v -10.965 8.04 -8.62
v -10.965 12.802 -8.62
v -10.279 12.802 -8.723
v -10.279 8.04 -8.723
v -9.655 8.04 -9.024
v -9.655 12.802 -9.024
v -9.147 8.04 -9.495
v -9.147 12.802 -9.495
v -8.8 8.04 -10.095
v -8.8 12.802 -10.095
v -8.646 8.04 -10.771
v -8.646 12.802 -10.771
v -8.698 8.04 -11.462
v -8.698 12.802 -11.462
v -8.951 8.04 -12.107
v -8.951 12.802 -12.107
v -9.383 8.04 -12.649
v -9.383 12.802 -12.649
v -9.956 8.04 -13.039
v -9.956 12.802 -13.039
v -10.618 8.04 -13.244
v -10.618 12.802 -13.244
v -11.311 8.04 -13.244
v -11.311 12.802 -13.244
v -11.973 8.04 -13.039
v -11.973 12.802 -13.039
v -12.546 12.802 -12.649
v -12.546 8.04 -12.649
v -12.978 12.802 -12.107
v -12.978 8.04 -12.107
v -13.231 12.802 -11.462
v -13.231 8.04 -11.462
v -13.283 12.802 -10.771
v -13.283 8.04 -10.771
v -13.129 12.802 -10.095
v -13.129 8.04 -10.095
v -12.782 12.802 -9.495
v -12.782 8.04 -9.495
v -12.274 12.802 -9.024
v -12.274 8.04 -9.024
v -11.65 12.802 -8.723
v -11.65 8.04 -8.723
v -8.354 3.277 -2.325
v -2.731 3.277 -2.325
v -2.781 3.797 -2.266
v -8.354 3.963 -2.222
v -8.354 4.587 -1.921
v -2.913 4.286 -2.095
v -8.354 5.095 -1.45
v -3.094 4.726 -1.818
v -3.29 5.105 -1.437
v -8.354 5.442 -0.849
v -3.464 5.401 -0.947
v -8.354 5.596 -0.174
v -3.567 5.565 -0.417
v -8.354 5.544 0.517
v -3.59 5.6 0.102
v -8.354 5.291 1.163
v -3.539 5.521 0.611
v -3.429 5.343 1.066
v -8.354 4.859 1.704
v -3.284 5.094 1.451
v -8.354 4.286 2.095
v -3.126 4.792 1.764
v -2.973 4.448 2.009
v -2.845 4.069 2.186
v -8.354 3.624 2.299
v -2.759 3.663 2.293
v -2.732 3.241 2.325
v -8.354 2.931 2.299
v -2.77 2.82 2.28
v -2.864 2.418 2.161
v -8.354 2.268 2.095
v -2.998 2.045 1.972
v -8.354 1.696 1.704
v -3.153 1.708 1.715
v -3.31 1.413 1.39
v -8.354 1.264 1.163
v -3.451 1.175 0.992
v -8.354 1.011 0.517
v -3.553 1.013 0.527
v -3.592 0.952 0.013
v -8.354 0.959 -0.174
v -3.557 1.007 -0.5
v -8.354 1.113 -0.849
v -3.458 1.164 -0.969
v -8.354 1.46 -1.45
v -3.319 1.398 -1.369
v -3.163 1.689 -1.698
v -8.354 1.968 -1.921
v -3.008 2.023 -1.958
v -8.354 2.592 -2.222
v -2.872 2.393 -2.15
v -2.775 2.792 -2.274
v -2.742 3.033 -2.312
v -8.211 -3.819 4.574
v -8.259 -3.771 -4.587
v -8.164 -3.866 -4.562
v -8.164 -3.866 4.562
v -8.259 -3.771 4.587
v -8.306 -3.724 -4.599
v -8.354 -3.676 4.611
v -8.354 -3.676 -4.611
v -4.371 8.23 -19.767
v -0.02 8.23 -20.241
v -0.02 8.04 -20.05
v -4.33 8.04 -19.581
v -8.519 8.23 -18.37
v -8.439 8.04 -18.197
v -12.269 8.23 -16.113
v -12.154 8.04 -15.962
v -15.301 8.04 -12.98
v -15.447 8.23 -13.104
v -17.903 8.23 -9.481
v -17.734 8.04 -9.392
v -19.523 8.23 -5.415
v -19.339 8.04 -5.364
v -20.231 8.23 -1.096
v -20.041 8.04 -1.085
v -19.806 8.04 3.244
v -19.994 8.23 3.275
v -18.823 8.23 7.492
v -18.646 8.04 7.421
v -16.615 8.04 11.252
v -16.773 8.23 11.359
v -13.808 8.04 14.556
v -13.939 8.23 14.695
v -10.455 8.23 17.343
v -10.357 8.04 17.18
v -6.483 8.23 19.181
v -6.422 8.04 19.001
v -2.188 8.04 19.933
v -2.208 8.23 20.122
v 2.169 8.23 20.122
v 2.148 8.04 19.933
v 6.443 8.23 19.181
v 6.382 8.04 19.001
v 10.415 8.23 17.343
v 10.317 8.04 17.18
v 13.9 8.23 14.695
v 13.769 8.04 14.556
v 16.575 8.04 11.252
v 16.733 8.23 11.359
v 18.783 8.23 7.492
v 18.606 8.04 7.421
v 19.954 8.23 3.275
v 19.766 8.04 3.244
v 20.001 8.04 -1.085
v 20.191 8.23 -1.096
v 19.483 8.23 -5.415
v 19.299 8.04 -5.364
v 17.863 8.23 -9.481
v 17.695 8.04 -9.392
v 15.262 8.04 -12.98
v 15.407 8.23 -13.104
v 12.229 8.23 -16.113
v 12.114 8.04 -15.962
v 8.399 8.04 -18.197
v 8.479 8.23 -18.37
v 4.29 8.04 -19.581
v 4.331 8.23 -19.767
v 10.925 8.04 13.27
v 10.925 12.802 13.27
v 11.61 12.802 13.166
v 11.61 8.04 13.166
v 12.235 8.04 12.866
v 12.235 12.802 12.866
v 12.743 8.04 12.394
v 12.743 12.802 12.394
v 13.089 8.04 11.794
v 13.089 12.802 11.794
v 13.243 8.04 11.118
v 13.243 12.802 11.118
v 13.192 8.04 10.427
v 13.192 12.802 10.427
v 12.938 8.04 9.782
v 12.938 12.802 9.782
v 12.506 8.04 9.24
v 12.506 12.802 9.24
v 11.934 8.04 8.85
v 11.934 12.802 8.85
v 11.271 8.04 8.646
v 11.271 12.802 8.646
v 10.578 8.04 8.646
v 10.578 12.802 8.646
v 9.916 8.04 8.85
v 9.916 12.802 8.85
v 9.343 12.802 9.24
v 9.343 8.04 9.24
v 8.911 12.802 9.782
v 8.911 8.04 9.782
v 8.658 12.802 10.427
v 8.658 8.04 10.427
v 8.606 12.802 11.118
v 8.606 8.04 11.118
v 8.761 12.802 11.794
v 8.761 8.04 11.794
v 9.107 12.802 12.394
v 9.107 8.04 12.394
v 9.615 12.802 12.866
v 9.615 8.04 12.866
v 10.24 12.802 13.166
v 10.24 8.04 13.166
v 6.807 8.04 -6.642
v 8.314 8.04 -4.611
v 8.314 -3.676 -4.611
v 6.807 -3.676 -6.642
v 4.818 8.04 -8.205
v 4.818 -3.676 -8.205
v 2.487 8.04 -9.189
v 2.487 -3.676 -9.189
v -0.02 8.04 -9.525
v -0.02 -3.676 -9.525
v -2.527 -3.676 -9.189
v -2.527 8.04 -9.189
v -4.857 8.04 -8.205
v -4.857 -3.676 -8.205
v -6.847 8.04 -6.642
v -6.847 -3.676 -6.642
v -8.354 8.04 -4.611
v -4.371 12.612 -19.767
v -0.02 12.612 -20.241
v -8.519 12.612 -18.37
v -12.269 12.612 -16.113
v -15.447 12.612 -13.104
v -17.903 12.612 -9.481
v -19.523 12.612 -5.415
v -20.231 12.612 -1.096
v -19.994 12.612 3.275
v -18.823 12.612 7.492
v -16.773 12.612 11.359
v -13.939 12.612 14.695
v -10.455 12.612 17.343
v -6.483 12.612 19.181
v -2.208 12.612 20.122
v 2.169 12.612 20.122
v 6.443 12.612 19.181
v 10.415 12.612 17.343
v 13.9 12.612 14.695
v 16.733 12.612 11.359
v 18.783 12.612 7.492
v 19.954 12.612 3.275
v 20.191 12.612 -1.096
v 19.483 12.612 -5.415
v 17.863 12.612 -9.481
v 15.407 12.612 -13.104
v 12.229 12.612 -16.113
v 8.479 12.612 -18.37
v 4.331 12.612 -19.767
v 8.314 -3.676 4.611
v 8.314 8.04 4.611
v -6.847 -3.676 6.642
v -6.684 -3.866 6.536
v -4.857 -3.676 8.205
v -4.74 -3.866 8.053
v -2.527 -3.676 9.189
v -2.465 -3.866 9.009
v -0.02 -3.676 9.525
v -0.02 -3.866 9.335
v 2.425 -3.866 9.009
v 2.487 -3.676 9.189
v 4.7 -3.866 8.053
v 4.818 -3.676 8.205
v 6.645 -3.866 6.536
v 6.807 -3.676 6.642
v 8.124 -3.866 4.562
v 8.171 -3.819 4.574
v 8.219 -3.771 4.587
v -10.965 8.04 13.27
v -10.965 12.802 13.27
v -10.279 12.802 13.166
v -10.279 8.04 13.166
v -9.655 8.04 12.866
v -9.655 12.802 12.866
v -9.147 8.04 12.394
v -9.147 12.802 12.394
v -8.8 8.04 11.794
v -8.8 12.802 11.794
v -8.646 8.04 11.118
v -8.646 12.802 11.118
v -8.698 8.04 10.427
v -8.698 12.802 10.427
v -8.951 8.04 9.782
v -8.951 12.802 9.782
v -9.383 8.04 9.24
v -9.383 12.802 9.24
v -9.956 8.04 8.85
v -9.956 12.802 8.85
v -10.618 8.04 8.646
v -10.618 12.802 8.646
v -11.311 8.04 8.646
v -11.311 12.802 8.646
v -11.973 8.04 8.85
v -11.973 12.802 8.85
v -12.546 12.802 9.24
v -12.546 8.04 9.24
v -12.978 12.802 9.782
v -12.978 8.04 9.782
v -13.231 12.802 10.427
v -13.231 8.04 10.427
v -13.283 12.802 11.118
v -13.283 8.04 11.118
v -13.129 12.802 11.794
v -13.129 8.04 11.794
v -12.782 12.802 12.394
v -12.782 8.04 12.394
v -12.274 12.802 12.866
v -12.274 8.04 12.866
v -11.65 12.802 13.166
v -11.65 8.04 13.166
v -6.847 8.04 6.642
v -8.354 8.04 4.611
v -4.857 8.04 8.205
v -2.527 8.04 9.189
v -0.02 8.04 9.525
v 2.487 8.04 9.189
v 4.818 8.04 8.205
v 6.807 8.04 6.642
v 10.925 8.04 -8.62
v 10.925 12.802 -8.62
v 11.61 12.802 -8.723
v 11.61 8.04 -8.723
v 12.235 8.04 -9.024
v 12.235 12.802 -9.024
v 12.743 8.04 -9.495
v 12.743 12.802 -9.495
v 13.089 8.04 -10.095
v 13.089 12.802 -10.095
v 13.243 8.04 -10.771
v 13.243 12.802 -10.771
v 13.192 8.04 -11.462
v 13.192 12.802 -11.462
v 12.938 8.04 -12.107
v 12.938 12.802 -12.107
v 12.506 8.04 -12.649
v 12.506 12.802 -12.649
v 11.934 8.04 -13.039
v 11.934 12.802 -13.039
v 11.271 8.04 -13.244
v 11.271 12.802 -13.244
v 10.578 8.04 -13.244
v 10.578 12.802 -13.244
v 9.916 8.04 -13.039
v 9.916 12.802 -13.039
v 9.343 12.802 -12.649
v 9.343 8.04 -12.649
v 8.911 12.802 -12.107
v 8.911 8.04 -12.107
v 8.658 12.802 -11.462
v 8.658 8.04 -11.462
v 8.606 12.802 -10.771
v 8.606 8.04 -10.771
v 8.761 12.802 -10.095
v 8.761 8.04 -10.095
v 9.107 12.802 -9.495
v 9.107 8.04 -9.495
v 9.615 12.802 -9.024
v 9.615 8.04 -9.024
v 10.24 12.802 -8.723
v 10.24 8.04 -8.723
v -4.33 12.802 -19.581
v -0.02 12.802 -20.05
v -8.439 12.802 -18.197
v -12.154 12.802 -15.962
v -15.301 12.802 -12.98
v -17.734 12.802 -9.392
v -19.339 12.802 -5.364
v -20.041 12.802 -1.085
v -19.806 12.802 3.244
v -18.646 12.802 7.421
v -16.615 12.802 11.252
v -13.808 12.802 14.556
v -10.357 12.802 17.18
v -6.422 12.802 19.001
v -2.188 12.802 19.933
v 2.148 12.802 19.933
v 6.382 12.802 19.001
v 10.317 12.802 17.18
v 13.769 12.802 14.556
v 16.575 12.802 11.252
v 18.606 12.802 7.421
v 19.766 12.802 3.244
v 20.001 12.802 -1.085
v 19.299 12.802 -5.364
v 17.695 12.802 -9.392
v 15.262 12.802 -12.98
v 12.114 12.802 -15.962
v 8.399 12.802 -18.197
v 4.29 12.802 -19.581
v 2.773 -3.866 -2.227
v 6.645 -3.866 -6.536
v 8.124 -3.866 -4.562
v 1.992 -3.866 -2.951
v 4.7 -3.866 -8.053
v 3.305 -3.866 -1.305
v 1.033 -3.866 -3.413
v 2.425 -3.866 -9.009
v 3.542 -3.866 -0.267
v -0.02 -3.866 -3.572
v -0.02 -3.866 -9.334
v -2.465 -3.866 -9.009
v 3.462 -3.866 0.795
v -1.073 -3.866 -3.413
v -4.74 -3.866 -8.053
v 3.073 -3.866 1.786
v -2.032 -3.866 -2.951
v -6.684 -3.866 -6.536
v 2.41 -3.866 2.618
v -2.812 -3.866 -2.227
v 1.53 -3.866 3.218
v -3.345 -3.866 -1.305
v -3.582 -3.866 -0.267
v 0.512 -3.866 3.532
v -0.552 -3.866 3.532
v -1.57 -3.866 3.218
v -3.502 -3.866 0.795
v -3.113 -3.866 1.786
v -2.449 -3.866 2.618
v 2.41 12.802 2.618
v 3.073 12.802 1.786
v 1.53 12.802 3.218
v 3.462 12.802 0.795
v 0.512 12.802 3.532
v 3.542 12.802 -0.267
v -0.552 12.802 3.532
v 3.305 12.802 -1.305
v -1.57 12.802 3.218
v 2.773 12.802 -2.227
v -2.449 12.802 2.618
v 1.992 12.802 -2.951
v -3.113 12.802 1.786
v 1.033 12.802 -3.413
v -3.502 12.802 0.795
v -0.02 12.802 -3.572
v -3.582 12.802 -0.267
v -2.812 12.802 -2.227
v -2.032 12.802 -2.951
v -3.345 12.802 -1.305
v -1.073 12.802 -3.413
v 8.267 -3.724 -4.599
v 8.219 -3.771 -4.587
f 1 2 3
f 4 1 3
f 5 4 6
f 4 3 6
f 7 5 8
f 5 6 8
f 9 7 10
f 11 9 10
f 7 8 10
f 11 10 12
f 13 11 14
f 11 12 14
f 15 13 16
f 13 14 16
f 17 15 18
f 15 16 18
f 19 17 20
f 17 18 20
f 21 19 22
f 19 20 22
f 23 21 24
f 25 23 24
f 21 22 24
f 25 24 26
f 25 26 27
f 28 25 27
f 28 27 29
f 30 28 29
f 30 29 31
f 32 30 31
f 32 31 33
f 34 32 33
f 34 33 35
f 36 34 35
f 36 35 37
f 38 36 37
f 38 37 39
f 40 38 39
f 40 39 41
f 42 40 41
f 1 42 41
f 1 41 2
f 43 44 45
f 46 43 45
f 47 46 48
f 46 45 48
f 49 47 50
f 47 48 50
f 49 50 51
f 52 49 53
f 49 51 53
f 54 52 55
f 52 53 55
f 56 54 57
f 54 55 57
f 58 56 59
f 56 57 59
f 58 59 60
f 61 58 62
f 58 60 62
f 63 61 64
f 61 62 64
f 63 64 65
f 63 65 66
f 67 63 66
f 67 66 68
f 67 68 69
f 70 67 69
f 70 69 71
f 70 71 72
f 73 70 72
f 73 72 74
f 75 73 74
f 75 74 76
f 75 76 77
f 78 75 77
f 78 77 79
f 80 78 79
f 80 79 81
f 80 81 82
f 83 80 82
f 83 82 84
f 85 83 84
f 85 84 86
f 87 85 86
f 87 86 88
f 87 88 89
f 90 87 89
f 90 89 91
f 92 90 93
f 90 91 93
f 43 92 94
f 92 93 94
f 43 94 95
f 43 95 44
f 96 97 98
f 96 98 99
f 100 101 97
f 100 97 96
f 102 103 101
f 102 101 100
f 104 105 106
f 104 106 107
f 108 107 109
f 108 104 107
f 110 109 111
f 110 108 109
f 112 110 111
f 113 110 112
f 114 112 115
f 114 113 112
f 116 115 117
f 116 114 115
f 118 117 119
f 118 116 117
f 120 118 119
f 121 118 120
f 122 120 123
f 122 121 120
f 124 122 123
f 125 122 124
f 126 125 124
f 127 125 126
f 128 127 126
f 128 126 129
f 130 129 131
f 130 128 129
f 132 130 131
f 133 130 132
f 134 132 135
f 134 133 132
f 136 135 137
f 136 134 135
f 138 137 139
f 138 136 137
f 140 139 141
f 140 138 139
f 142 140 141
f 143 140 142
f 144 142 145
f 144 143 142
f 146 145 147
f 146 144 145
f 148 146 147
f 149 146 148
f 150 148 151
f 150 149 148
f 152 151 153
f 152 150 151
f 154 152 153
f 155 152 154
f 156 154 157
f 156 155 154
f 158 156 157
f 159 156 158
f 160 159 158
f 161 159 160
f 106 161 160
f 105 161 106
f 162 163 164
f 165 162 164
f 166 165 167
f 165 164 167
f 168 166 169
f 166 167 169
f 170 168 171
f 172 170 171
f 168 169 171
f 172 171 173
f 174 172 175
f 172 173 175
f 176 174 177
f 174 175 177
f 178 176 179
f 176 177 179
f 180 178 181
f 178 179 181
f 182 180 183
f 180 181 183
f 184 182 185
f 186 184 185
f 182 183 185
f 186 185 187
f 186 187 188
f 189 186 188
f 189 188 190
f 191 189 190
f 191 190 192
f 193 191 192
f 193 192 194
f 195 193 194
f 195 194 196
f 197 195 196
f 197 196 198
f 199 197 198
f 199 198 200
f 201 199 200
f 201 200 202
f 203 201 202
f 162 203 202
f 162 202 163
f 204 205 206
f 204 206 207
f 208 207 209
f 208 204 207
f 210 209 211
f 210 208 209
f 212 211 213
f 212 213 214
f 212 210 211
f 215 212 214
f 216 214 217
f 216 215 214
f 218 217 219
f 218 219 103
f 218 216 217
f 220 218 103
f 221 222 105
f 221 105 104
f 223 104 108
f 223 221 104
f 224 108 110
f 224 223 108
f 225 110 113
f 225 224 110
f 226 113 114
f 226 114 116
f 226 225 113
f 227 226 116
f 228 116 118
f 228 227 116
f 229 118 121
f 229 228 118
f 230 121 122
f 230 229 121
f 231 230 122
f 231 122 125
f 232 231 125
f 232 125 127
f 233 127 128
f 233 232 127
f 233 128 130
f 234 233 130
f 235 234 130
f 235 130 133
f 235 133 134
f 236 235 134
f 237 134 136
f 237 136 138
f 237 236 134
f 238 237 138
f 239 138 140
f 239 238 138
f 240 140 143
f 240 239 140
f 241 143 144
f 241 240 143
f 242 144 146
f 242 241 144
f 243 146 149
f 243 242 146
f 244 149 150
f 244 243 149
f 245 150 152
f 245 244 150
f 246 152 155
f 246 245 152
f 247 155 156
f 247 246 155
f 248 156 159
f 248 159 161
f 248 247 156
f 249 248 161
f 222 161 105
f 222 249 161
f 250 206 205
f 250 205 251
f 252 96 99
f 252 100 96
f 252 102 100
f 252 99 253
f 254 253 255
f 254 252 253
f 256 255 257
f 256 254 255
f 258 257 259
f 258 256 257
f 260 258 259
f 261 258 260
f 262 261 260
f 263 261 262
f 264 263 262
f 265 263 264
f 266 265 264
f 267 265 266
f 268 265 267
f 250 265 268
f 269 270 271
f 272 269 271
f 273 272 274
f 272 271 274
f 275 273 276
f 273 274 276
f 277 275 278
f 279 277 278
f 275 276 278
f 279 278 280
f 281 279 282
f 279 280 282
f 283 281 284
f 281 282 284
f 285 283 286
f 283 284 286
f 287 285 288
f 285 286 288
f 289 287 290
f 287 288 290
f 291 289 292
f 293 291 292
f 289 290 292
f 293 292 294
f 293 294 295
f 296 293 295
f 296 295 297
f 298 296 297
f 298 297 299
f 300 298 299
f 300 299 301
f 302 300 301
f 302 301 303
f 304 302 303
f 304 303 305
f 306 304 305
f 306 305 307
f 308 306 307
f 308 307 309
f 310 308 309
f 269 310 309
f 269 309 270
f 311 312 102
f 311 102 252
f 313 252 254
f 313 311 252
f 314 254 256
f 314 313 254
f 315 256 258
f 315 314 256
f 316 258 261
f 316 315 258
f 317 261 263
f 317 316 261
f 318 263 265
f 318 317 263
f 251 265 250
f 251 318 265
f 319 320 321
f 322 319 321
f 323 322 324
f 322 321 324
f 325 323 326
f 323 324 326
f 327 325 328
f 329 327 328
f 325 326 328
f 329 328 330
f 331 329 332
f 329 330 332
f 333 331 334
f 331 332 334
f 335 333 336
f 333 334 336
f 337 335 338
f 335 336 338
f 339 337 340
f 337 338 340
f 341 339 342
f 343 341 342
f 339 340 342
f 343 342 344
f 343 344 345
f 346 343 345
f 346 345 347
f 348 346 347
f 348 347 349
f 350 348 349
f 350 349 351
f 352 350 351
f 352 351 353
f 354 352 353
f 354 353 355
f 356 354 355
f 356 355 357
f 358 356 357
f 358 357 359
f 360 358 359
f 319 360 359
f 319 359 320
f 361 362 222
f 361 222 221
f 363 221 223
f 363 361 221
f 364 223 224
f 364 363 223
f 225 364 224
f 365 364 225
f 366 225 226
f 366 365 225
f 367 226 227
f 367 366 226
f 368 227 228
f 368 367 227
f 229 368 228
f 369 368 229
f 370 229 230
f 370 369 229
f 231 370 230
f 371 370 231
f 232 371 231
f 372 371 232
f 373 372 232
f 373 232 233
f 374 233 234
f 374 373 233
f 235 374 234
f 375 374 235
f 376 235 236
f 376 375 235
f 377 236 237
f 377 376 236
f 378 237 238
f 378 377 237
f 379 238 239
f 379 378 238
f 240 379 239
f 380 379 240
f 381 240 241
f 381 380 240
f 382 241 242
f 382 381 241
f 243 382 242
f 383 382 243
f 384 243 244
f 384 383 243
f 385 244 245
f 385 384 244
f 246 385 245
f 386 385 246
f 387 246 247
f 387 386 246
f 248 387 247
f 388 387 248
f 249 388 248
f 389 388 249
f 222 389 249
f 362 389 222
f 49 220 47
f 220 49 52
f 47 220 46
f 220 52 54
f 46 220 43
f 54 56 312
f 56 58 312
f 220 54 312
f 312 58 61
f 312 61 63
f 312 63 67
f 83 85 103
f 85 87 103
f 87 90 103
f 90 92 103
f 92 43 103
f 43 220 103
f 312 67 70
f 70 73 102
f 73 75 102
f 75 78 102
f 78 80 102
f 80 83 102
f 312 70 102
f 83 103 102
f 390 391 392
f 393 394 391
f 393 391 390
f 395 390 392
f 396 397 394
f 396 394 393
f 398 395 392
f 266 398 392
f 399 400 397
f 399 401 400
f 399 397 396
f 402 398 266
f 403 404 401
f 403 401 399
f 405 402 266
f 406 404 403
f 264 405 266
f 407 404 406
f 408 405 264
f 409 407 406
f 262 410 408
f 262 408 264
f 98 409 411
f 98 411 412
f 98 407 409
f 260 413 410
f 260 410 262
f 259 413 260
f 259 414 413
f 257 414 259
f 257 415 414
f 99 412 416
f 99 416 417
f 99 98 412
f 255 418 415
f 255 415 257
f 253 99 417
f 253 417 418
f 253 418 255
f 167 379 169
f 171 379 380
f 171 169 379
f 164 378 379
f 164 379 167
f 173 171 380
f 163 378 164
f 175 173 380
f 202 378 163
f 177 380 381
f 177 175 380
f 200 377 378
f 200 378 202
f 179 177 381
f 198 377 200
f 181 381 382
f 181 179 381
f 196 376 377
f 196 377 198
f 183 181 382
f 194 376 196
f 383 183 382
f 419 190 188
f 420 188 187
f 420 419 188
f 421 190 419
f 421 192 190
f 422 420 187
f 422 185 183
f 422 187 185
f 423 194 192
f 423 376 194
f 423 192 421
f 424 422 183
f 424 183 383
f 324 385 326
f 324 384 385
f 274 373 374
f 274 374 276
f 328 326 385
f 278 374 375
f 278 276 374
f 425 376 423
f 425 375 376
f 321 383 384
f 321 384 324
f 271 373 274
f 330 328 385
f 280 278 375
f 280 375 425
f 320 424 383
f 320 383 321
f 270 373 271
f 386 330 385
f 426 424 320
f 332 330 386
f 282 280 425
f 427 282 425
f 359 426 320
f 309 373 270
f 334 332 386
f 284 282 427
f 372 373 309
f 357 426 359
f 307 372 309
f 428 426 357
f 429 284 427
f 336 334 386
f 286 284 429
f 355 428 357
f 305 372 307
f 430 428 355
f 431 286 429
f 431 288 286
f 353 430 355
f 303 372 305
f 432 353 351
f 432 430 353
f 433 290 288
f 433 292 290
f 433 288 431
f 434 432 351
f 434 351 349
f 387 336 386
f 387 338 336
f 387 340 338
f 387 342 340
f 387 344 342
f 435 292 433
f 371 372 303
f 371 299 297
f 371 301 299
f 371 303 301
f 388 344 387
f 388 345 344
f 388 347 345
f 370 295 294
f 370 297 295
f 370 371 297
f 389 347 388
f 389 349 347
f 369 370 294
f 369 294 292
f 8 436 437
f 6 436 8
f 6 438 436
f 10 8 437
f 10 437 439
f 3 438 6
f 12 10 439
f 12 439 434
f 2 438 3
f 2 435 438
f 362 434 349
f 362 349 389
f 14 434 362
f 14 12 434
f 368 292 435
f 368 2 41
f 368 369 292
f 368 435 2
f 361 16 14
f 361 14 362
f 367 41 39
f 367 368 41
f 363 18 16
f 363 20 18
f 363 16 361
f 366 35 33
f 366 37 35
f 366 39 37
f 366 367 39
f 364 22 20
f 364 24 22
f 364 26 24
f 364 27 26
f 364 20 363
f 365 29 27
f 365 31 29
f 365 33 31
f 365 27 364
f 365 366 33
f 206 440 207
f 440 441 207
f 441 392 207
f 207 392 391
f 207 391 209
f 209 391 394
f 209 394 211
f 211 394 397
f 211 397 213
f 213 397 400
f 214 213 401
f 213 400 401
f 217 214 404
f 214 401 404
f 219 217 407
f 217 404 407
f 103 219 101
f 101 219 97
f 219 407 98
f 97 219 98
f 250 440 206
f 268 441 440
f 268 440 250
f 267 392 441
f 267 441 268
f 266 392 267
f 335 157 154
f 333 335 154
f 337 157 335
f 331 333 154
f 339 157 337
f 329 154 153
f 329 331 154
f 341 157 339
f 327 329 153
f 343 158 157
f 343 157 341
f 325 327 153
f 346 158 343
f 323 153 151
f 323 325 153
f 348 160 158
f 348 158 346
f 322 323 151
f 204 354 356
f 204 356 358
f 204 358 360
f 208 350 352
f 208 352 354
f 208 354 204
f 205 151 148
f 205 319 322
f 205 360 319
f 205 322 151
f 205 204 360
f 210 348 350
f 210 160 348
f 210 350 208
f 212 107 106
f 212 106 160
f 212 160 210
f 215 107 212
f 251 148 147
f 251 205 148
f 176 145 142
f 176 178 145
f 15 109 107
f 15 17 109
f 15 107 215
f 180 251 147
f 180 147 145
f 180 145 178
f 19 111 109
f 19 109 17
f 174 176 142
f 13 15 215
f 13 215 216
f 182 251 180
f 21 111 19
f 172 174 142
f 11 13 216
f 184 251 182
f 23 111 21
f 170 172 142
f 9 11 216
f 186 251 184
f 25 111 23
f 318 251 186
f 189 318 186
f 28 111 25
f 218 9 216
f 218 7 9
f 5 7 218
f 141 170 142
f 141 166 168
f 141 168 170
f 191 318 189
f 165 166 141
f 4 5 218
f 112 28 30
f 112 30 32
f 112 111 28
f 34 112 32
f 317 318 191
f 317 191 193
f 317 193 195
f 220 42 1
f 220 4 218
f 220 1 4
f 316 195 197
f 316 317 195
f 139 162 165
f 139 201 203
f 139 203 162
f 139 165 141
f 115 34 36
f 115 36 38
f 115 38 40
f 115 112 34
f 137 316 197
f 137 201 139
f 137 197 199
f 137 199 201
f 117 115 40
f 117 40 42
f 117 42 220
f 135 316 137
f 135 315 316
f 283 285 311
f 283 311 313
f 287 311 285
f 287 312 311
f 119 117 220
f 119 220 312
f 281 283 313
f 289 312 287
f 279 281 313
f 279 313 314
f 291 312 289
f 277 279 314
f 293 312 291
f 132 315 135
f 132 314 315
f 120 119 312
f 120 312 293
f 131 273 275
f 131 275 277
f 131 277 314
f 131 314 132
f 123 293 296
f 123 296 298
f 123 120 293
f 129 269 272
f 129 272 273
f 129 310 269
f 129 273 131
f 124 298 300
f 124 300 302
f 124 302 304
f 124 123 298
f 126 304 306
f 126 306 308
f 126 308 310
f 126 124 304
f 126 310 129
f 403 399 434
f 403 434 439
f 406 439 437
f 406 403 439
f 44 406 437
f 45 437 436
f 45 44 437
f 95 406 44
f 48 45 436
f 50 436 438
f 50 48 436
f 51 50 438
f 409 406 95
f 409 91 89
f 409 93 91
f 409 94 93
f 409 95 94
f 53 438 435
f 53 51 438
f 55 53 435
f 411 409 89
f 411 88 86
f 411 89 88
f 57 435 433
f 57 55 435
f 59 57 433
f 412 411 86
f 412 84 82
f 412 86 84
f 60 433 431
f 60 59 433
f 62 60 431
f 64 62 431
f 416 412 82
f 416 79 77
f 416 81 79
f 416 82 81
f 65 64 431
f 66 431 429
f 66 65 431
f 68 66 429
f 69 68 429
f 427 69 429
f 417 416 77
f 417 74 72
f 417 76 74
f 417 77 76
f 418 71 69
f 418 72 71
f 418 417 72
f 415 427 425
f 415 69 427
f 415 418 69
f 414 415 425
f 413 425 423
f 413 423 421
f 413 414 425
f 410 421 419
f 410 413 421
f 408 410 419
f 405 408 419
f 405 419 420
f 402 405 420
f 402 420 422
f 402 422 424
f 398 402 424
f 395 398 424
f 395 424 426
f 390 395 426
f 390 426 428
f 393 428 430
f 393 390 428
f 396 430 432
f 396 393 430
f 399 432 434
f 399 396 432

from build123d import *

# Parameters (mm, degrees)
SKETCH2_W          = 1.5875
SKETCH2_H          = 6.148361062
CUT_EXTRUDE1_DEPTH = 7.9375
SKETCH3_R          = 1.55
CUT_EXTRUDE2_DEPTH = 23.082804042
SKETCH4_R          = 1.55
CUT_EXTRUDE3_DEPTH = 23.082804093
CHAMFER1_SIZE      = 0.127
SCALE1_SCALE       = 1.5


with BuildPart() as part:
    # Sketch1 → Revolve1 (revolve)
    with BuildSketch(Plane.XY, mode=Mode.PRIVATE) as revolve1_sk:
        Polygon((6.35, 0), (6.35, 7.9375), (13.49375, 7.9375), (13.49375, 11.1125), (2.38125, 11.1125), (2.38125, 0), align=None)
    revolve(revolve1_sk.sketch.rotate(Axis((0, 0, 0), (0, 1, 0)), 90), axis=Axis((0, 0, 0), (0, 1, 0)))

    # Sketch2 → Cut-Extrude1 (cut)
    with BuildSketch(Plane.XZ):
        with Locations((-6.35, 0)):
            Rectangle(SKETCH2_W, SKETCH2_H)
        with Locations((6.35, 0)):
            Rectangle(SKETCH2_W, SKETCH2_H)
    extrude(amount=-CUT_EXTRUDE1_DEPTH, mode=Mode.SUBTRACT)

    # Sketch3 → Cut-Extrude2 (cut, through all)
    with BuildSketch(Plane(origin=(0, 0, 0), x_dir=(0, 0, -1), z_dir=(1, 0, 0))):
        with Locations((0, 4.7625)):
            Circle(SKETCH3_R)
    extrude(amount=-CUT_EXTRUDE2_DEPTH, mode=Mode.SUBTRACT)

    # Sketch4 → Cut-Extrude3 (cut, through all)
    with BuildSketch(Plane(origin=(0, 11.1125, 0), x_dir=(1, 0, 0), z_dir=(0, 1, 0))):
        with Locations(Location((-7.296458098, 7.296458098, 0), (0, 0, 270))):
            Circle(SKETCH4_R)
        with Locations(Location((7.296458098, 7.296458098, 0), (0, 0, 270))):
            Circle(SKETCH4_R)
        with Locations(Location((7.296458098, -7.296458098, 0), (0, 0, 270))):
            Circle(SKETCH4_R)
        with Locations(Location((-7.296458098, -7.296458098, 0), (0, 0, 270))):
            Circle(SKETCH4_R)
    extrude(amount=-CUT_EXTRUDE3_DEPTH, mode=Mode.SUBTRACT)

    # Chamfer1
    chamfer1_edges = [part.edges().sort_by_distance(p)[0] for p in [
        (0, 0, -6.35),
        (-5.55625, 0, 0),
        (0, 0, 6.35),
        (5.55625, 0, 0),
        (0, 7.9375, 13.49375),
        (0, 11.1125, 13.49375),
    ]]
    chamfer(chamfer1_edges, length=CHAMFER1_SIZE)


with BuildPart() as part_1:
    # Scale1: scaled about (0.039762261, 7.732974778, -1.52e-07)
    add(part.part.scale(SCALE1_SCALE).moved(Location((-0.019881131, -3.866487389, 7.6e-08))))


solid = part_1.part
